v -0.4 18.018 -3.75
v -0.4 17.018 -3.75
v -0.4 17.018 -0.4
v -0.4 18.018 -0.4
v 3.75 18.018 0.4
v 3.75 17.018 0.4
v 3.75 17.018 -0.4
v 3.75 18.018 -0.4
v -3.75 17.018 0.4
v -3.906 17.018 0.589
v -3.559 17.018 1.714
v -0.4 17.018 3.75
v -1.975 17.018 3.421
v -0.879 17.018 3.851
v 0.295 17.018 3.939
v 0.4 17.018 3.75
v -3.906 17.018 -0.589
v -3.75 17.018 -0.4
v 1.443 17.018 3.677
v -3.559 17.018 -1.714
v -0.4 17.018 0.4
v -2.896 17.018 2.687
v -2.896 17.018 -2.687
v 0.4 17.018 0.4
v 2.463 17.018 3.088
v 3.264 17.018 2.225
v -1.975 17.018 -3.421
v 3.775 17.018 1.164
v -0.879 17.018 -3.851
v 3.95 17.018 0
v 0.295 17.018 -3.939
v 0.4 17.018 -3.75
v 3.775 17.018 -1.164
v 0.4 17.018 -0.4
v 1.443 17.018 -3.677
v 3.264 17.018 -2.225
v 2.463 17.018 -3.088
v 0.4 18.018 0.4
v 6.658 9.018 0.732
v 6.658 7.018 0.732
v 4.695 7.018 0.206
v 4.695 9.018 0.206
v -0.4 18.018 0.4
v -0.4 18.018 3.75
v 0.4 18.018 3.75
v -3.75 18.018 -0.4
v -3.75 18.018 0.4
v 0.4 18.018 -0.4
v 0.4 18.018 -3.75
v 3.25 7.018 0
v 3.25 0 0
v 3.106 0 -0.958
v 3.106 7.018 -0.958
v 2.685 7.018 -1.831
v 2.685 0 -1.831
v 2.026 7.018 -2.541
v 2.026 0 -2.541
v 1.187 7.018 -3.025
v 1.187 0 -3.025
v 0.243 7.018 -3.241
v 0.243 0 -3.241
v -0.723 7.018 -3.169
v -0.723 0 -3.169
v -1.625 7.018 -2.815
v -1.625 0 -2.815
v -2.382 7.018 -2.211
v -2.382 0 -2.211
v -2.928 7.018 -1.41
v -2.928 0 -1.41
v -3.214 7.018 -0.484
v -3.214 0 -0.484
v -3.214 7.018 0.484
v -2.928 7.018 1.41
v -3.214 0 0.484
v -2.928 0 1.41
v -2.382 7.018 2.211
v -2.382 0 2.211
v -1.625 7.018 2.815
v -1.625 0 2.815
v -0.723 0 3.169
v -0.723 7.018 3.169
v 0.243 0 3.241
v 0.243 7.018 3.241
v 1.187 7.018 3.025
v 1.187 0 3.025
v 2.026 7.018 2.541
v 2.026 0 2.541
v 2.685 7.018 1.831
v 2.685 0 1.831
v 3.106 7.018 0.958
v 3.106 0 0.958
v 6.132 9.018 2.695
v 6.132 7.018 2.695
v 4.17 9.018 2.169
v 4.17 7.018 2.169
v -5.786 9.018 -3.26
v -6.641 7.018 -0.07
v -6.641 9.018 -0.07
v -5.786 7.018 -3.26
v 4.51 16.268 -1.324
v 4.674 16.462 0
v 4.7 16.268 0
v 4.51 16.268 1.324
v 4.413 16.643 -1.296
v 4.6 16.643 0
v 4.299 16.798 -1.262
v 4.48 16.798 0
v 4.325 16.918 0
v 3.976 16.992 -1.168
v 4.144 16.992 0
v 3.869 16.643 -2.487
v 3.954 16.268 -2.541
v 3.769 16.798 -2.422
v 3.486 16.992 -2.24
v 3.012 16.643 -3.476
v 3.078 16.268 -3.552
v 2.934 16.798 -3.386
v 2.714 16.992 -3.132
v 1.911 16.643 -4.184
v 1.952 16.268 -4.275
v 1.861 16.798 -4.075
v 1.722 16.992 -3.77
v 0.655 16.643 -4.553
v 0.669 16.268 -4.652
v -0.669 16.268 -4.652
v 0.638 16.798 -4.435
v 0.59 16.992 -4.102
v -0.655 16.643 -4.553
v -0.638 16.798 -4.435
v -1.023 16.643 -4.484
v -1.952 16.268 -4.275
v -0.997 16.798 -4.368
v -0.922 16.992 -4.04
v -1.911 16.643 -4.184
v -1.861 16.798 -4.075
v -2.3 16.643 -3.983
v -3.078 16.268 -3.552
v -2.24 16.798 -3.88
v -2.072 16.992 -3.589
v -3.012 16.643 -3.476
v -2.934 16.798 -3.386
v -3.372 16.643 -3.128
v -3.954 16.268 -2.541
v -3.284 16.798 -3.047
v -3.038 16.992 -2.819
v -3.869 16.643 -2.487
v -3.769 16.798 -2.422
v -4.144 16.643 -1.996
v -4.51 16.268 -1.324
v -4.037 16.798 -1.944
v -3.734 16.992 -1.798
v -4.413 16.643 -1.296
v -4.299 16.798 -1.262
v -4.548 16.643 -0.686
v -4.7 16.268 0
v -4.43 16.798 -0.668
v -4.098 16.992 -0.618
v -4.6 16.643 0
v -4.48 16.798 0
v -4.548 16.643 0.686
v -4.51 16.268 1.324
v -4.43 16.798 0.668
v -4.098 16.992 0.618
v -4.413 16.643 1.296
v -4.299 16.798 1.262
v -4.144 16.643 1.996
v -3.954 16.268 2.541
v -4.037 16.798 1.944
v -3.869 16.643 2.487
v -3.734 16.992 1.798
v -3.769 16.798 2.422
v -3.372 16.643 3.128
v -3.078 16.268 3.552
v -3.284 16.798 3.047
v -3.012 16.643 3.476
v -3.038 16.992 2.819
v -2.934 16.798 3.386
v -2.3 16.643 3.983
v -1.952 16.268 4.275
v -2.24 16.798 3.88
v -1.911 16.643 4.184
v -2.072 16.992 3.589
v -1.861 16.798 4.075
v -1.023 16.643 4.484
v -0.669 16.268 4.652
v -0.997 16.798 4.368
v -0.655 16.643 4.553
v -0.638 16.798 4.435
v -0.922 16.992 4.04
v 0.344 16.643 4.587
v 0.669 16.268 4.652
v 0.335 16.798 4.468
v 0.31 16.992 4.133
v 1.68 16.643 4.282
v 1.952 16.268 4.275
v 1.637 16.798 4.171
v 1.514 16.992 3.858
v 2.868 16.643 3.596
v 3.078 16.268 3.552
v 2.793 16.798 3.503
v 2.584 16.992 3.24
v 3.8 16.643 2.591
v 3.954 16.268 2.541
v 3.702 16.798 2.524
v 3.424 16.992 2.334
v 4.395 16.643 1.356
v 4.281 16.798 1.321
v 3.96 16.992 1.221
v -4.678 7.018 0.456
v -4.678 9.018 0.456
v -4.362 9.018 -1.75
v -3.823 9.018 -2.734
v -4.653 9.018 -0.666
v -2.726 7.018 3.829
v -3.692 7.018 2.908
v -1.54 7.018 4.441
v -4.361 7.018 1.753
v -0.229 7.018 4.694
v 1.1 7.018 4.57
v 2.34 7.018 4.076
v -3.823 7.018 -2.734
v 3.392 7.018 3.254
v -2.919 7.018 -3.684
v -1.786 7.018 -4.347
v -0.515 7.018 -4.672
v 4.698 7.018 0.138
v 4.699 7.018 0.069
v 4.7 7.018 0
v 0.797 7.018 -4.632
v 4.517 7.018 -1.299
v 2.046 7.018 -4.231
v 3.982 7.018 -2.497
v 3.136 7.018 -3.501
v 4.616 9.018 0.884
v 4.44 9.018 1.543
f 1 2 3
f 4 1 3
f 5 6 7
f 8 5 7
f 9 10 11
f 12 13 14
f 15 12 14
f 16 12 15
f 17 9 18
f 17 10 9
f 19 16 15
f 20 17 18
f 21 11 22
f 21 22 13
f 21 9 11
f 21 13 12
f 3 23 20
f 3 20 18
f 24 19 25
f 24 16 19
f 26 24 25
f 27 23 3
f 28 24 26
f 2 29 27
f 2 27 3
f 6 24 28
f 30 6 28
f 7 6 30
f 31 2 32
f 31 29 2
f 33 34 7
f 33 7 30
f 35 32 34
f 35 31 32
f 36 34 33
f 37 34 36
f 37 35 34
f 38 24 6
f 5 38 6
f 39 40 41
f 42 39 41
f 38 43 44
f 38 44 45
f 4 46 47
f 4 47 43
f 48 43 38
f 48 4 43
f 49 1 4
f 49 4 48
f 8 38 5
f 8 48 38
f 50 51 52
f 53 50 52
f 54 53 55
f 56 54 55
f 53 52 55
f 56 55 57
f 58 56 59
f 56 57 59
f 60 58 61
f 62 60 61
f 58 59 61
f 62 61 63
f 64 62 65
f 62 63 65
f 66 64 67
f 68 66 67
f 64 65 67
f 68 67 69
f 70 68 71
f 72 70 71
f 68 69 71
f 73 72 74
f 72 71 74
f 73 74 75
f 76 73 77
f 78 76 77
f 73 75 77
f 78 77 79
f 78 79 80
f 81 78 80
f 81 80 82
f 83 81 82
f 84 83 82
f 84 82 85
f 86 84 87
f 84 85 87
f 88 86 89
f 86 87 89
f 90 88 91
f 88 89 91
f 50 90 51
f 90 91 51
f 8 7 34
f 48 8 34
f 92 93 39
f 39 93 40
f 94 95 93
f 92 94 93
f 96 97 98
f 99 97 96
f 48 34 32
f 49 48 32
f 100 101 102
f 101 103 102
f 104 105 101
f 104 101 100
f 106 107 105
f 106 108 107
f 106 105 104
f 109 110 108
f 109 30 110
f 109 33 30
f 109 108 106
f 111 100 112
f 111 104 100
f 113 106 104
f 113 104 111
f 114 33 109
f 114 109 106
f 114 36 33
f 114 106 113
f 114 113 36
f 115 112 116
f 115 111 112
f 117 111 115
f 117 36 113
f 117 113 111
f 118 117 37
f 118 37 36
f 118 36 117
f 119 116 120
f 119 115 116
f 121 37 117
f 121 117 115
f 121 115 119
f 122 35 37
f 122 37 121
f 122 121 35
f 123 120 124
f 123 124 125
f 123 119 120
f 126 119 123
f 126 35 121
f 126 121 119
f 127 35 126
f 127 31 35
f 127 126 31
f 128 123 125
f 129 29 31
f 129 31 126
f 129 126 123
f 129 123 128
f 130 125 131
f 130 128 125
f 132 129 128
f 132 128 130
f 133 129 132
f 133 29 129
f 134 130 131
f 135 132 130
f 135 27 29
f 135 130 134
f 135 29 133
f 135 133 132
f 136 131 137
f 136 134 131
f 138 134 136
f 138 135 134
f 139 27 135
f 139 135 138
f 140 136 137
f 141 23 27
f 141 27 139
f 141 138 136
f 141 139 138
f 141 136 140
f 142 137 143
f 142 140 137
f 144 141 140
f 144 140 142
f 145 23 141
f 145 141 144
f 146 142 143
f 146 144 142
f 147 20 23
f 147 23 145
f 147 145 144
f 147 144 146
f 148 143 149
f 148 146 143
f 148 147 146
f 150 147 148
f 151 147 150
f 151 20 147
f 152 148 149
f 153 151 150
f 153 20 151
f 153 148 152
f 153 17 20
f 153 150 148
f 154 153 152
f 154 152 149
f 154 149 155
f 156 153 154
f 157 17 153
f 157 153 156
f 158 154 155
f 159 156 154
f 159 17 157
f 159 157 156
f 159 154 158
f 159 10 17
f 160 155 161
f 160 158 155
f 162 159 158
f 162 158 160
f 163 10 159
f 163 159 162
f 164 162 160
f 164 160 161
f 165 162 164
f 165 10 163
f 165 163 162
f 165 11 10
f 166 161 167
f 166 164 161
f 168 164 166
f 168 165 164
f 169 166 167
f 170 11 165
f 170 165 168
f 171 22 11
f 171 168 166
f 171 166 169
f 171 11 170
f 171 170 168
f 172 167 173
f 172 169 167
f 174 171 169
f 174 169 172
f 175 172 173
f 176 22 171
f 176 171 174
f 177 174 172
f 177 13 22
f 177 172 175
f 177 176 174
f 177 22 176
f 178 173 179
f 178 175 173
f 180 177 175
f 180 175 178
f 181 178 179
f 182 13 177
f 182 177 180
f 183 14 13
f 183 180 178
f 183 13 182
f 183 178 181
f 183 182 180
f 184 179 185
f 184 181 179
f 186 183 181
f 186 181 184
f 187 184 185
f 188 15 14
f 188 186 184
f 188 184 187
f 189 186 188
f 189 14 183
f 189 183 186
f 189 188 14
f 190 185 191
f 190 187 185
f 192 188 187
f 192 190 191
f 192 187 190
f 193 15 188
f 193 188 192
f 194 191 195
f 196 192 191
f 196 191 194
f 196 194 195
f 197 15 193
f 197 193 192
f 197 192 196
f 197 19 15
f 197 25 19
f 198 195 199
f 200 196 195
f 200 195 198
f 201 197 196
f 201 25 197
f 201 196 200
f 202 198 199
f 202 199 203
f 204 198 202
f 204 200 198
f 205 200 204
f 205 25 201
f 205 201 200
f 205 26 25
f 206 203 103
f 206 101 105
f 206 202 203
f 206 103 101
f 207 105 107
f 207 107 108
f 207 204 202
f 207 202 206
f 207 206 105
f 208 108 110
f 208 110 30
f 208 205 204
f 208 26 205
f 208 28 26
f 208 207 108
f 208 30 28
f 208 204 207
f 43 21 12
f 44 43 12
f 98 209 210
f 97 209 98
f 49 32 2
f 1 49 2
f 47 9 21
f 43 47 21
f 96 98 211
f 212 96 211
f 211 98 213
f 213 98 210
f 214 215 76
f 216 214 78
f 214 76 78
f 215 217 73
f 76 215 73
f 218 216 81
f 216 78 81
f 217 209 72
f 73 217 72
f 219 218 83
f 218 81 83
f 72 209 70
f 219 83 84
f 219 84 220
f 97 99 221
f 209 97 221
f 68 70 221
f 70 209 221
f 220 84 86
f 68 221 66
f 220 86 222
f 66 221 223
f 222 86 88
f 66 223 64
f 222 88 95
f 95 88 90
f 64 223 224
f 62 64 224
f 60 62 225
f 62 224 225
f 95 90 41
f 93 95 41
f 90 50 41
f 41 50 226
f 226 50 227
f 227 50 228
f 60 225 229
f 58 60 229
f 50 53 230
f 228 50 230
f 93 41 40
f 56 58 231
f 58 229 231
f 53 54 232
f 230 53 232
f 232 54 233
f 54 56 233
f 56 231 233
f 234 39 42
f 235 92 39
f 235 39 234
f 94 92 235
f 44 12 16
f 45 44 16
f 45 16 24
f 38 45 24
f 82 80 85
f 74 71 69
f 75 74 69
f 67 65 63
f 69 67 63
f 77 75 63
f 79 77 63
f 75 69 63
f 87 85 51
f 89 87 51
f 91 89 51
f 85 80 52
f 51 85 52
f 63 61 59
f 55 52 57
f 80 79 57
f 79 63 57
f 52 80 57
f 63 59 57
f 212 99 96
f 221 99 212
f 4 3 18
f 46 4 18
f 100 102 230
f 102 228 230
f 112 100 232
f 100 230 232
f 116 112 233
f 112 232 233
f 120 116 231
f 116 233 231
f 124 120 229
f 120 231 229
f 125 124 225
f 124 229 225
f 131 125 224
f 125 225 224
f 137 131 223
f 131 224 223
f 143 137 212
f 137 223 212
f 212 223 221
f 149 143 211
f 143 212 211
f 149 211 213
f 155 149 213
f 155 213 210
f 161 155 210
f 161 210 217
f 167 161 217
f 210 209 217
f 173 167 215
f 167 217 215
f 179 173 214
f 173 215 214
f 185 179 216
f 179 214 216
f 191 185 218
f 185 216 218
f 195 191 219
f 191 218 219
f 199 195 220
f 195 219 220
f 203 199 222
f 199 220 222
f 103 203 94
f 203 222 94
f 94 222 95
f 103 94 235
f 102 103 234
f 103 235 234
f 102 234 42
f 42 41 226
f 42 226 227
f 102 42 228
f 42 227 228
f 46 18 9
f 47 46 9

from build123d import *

# Parameters (mm, degrees)
SKETCH1_R           = 3.25
BOSS_EXTRUDE1_DEPTH = 7.018
SKETCH6_R           = 4.7
BOSS_EXTRUDE2_DEPTH = 10
BOSS_EXTRUDE3_DEPTH = 1
FILLET1_R           = 0.75
BOSS_EXTRUDE4_DEPTH = 2


with BuildPart() as part:
    # Sketch1 → Boss-Extrude1 (new body)
    with BuildSketch(Plane(origin=(0, 0, 0), x_dir=(1, 0, 0), z_dir=(0, 1, 0))):
        Circle(SKETCH1_R)
    extrude(amount=BOSS_EXTRUDE1_DEPTH)

    # Sketch6 → Boss-Extrude2 (add)
    with BuildSketch(Plane(origin=(0, 7.018, 0), x_dir=(1, 0, 0), z_dir=(0, 1, 0))):
        Circle(SKETCH6_R)
    extrude(amount=BOSS_EXTRUDE2_DEPTH)

    # Sketch8 → Boss-Extrude3 (add)
    with BuildSketch(Plane(origin=(0, 17.018, 0), x_dir=(1, 0, 0), z_dir=(0, 1, 0))):
        Polygon((0.4, 3.75), (-0.4, 3.75), (-0.4, 0.4), (-3.75, 0.4), (-3.75, -0.4), (-0.4, -0.4), (-0.4, -3.75), (0.4, -3.75), (0.4, -0.4), (3.75, -0.4), (3.75, 0.4), (0.4, 0.4), align=None)
    extrude(amount=BOSS_EXTRUDE3_DEPTH)

    # Fillet1
    fillet1_edges = [part.edges().sort_by_distance(p)[0] for p in [
        (-4.7, 17.018, 0),
    ]]
    fillet(fillet1_edges, radius=FILLET1_R)

    # Sketch10 → Boss-Extrude4 (add)
    with BuildSketch(Plane.XZ.offset(-7.018)):
        with BuildLine():
            Line((4.169549594, 2.169068046), (6.132310873, 2.694988345))
            Line((6.132310873, 2.694988345), (6.658231172, 0.732227066))
            Line((6.658231172, 0.732227066), (4.695469893, 0.206306767))
            ThreePointArc((4.695469893, 0.206306767), (4.539851384, 1.216449512), (4.169549594, 2.169068046))
        make_face()
        with BuildLine():
            Line((-4.677844754, 0.45581625), (-6.640606033, -0.07010405))
            Line((-6.640606033, -0.07010405), (-5.785985547, -3.259591128))
            Line((-5.785985547, -3.259591128), (-3.823224268, -2.733670829))
            ThreePointArc((-3.823224268, -2.733670829), (-4.539851384, -1.216449512), (-4.677844754, 0.45581625))
        make_face()
    extrude(amount=-BOSS_EXTRUDE4_DEPTH)


solid = part.part
